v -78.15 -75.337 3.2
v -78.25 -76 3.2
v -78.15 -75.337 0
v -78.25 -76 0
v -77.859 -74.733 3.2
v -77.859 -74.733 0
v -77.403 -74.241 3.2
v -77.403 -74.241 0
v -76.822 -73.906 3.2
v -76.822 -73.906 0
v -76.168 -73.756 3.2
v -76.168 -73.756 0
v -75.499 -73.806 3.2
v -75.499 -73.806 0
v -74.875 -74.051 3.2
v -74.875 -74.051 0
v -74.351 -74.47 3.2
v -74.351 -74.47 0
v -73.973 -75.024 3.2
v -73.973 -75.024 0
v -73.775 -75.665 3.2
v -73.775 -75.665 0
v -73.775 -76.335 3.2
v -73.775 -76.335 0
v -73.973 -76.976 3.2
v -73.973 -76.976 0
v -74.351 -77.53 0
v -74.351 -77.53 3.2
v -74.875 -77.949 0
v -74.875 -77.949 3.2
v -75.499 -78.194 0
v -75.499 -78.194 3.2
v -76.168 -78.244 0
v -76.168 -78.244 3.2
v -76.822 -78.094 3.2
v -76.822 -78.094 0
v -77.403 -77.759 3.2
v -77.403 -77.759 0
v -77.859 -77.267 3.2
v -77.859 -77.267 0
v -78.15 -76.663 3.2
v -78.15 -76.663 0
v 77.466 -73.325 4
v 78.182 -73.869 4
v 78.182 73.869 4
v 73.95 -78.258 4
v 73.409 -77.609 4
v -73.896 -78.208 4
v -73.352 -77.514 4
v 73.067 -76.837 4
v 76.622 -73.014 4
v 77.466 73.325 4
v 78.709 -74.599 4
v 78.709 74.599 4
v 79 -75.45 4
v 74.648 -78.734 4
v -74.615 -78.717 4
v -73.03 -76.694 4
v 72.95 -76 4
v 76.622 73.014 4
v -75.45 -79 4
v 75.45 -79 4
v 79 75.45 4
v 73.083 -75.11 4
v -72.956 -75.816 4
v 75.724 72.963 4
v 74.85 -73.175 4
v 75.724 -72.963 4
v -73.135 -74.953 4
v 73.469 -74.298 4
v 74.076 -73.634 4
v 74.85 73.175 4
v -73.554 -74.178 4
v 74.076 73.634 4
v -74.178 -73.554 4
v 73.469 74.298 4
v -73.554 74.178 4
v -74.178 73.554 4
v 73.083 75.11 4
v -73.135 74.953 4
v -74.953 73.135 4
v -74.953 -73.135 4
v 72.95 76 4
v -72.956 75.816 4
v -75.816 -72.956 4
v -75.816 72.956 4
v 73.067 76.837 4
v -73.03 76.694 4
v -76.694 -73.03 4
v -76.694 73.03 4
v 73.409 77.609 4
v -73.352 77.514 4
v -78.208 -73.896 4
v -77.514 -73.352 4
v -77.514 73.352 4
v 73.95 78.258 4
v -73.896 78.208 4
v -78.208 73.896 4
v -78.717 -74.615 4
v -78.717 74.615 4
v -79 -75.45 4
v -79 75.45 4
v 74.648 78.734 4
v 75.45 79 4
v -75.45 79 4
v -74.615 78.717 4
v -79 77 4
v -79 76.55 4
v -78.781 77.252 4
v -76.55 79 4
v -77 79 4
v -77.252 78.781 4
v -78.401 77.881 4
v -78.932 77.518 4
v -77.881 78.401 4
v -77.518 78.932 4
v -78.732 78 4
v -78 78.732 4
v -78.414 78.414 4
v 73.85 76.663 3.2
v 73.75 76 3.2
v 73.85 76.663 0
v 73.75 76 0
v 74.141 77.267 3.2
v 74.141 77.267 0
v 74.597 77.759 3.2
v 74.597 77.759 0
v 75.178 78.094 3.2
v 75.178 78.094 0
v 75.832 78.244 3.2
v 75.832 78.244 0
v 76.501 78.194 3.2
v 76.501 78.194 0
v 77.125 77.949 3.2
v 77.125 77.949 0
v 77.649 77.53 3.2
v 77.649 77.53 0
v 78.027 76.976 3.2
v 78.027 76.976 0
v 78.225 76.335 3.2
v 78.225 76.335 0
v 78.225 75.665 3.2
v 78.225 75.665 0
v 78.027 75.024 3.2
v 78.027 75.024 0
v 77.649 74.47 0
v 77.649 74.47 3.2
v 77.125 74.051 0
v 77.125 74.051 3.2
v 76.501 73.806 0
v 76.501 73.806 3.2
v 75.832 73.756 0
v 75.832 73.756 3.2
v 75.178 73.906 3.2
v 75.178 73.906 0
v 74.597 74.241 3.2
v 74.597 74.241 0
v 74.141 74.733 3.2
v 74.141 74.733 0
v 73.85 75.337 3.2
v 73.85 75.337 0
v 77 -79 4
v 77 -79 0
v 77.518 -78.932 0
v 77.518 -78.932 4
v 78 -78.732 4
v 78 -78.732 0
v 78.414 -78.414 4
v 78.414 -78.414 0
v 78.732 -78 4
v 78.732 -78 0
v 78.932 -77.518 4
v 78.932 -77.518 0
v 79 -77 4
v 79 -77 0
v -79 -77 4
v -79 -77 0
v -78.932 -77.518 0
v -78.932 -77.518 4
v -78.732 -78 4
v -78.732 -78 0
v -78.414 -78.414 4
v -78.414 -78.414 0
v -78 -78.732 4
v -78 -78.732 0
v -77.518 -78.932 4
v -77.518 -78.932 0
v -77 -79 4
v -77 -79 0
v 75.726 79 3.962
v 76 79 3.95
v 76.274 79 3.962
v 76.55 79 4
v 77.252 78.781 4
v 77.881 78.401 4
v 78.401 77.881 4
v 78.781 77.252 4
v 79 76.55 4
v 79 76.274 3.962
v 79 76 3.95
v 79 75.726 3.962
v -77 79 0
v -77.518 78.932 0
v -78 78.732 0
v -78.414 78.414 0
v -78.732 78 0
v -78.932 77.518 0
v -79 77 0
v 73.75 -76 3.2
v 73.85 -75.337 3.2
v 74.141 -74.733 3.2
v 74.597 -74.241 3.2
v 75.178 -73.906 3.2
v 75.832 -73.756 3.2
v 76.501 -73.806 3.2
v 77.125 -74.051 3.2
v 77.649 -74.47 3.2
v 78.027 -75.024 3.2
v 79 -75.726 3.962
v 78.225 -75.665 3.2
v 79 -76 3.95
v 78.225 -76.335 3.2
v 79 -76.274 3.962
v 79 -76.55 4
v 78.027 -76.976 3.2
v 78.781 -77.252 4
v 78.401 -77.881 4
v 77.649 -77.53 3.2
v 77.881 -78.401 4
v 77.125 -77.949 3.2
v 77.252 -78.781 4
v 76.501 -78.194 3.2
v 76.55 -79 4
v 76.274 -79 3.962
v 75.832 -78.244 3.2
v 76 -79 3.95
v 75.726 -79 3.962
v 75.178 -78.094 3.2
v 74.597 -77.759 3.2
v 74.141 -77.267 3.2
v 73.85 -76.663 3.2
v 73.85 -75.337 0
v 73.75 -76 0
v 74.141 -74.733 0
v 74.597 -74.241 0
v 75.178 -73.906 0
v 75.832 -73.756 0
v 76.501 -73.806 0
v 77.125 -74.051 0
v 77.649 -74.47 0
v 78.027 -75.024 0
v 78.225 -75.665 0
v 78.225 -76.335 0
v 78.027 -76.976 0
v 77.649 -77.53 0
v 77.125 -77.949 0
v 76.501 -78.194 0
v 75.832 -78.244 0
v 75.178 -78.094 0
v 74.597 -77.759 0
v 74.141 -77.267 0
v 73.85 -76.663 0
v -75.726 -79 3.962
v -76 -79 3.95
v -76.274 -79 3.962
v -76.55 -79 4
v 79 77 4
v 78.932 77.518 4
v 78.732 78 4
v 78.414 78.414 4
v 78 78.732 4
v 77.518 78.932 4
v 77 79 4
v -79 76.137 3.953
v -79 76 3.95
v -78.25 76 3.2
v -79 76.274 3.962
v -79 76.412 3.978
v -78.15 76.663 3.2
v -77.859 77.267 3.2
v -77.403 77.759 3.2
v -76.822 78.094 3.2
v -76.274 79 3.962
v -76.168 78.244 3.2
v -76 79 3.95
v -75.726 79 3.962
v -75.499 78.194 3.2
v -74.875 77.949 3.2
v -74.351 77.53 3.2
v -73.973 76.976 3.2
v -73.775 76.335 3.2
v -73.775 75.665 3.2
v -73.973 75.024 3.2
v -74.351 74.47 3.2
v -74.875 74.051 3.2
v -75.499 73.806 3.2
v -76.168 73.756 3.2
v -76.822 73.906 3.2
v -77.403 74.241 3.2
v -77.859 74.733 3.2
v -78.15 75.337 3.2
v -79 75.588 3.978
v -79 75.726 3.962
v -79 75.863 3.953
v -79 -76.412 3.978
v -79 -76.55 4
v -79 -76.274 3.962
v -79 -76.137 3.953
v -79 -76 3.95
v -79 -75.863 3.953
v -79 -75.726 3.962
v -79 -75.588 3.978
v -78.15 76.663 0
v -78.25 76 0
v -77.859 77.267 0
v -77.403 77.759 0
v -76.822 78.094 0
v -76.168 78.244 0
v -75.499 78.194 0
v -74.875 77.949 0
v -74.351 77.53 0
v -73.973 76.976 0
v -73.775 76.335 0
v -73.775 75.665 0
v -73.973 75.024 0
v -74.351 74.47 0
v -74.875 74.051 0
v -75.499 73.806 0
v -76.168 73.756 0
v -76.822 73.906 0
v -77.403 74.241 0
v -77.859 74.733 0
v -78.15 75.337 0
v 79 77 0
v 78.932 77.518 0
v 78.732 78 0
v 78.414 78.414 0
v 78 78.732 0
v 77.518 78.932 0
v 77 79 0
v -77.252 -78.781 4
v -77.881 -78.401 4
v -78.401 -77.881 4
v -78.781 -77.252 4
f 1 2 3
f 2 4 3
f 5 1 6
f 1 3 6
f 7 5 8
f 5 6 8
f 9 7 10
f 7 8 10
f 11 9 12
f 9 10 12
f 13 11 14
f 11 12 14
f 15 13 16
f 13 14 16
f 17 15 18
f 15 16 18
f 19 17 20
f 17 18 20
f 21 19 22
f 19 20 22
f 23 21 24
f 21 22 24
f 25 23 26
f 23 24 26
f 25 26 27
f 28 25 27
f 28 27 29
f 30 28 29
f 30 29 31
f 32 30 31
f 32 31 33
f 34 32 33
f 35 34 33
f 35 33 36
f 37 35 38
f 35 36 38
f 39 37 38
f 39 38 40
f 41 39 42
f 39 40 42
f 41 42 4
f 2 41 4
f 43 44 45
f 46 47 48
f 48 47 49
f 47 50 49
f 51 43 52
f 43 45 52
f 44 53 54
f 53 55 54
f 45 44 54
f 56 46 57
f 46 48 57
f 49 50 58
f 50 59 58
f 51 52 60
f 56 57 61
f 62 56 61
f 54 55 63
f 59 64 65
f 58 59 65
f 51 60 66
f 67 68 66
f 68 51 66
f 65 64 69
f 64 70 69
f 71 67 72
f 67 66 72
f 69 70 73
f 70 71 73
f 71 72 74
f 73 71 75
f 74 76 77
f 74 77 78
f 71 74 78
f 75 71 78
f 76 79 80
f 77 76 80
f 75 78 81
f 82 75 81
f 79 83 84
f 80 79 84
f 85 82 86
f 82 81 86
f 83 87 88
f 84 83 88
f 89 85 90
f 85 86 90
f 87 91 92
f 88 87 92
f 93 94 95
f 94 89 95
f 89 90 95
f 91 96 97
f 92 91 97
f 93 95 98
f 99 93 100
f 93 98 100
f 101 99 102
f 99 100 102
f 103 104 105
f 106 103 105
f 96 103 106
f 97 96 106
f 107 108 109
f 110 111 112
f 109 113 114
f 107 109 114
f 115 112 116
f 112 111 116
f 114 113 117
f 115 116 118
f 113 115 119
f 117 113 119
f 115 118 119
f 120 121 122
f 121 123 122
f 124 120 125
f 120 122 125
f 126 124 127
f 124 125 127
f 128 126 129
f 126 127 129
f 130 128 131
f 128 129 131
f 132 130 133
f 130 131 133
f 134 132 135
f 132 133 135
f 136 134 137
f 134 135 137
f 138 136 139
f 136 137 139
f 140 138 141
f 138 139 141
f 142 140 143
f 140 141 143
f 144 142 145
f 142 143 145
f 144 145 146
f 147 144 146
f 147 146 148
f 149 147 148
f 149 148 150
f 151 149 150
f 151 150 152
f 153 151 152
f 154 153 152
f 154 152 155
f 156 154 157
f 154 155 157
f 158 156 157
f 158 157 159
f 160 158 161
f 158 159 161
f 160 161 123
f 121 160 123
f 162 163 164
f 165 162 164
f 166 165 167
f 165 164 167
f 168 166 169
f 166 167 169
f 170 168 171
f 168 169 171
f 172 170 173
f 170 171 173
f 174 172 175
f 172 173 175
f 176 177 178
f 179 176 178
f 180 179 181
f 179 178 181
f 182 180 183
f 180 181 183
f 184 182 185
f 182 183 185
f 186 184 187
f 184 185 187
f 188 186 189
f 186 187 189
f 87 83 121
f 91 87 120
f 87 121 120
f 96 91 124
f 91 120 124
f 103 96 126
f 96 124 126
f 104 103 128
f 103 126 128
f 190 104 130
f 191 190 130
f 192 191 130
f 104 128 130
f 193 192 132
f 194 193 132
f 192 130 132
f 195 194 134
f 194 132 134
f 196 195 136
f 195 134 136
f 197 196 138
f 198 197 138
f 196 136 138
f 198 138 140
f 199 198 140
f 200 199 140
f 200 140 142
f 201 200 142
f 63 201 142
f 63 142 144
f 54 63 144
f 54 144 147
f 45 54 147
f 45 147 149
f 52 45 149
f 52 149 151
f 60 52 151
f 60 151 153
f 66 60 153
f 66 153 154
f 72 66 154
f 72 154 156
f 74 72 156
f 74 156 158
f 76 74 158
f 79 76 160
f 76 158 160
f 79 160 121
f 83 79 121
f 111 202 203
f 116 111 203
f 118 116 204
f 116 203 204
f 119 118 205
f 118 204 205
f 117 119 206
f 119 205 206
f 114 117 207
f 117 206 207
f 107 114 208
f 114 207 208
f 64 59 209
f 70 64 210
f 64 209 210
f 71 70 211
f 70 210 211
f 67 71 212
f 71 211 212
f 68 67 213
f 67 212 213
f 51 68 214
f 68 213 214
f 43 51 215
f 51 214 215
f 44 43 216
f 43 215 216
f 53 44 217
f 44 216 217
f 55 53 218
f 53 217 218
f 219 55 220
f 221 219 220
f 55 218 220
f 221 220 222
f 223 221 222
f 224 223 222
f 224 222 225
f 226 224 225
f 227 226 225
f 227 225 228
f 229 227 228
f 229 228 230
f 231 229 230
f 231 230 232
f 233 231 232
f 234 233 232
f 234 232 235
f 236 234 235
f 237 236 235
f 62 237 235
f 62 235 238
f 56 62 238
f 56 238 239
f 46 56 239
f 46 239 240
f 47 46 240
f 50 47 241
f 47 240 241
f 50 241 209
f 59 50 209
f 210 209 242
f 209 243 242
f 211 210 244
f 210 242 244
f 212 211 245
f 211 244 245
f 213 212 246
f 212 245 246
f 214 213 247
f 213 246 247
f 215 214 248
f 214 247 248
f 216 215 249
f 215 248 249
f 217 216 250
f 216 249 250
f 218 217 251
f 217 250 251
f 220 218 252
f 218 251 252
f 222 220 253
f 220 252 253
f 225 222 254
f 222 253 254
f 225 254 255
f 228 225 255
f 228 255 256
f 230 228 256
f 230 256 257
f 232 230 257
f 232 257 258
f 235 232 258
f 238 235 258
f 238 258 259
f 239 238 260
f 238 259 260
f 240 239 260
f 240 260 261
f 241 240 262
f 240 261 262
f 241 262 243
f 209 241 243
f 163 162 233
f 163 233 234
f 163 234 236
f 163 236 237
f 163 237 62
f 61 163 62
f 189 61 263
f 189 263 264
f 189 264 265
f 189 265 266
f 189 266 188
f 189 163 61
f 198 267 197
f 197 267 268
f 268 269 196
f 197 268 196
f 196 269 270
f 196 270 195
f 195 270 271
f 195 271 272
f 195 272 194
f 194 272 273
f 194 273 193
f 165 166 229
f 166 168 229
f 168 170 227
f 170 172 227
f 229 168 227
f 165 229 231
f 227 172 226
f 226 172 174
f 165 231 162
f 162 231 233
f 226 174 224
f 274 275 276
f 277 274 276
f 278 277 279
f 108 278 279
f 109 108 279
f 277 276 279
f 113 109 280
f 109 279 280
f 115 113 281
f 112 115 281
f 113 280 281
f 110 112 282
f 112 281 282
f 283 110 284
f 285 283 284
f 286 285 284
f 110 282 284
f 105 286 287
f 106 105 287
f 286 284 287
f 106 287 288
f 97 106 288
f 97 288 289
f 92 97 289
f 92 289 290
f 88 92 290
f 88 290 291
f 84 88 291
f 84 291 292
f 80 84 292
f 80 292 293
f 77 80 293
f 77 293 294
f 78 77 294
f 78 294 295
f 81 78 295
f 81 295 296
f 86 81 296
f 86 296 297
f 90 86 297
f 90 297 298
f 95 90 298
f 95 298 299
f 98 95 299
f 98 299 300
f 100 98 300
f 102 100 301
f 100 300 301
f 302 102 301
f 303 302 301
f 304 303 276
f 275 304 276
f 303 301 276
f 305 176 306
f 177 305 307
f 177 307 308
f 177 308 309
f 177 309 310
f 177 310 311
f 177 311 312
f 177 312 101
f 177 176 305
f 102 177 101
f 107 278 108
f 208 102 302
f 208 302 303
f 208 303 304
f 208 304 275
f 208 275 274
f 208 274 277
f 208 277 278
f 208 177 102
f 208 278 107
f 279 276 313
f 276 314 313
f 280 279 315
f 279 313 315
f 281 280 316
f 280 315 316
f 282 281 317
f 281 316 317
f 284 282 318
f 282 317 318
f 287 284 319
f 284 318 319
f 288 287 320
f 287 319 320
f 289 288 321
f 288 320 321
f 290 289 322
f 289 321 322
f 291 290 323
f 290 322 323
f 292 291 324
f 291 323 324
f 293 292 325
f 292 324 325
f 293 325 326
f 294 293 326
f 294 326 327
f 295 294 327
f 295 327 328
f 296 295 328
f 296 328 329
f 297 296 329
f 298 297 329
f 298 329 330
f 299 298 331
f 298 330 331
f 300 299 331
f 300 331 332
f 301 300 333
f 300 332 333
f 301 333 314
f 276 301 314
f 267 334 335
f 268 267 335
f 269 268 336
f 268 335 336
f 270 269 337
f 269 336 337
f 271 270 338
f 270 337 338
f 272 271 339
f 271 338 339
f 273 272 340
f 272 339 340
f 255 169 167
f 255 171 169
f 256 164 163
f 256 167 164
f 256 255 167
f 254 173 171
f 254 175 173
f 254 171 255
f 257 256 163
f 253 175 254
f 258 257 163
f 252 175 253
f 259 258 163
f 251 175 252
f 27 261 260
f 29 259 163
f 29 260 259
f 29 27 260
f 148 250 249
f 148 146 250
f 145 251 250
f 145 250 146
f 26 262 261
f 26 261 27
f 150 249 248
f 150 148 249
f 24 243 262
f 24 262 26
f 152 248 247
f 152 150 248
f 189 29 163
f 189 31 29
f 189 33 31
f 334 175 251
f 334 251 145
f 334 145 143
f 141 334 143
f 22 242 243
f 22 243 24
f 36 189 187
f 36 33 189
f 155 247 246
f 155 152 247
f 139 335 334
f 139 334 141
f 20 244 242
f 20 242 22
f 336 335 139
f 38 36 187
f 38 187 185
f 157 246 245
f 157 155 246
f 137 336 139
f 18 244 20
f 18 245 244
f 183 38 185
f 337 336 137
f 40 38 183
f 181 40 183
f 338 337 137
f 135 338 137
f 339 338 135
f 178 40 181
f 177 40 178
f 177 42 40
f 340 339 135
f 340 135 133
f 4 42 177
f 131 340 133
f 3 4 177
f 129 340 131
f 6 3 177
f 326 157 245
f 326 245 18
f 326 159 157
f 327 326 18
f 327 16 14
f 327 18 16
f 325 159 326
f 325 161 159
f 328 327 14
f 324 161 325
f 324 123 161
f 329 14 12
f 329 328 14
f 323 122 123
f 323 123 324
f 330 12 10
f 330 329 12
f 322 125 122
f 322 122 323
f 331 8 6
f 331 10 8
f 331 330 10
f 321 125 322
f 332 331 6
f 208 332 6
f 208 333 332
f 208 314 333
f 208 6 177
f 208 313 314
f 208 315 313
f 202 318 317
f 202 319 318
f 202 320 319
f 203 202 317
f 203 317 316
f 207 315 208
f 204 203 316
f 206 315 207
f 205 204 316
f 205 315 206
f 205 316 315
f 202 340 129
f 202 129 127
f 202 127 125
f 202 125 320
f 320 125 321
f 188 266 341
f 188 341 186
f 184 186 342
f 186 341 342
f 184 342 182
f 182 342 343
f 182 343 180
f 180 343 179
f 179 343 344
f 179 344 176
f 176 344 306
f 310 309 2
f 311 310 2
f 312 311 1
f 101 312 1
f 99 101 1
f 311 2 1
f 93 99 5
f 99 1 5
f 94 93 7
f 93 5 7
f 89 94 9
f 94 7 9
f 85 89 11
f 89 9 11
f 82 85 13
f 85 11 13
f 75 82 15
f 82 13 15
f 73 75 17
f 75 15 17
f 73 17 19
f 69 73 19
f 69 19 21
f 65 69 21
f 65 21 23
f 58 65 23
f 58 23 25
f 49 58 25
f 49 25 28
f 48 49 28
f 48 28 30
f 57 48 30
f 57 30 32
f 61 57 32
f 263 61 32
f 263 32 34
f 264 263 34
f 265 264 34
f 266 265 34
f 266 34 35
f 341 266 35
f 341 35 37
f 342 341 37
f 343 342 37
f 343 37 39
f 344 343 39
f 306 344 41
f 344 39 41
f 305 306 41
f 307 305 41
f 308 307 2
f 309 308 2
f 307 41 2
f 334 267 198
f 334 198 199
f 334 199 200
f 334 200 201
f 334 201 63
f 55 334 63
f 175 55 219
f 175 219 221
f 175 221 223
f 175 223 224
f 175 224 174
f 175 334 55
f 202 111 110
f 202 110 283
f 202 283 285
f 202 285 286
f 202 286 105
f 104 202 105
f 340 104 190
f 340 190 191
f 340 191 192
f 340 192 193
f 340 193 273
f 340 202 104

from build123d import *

# Parameters (mm, degrees)
PAD_DEPTH        = 4
HOLE_D           = 4.5
HOLE_DEPTH       = 4
HOLE_CSINK_D     = 6.1
HOLE_CSINK_ANGLE = 90
HOLE_TIPS_R      = 2.25


with BuildPart() as part:
    # Sketch → Pad (new body)
    with BuildSketch(Plane.XY):
        with BuildLine():
            Line((-77, 79), (77, 79))
            ThreePointArc((79, 77), (78.414214, 78.414214), (77, 79))
            Line((79, 77), (79, -77))
            ThreePointArc((77, -79), (78.414214, -78.414214), (79, -77))
            Line((77, -79), (-77, -79))
            ThreePointArc((-79, -77), (-78.414214, -78.414214), (-77, -79))
            Line((-79, -77), (-79, 77))
            ThreePointArc((-77, 79), (-78.414214, 78.414214), (-79, 77))
        make_face()
    extrude(amount=PAD_DEPTH)

    # Hole
    with Locations(Plane.XY.offset(4)):
        with Locations((-76, 76), (76, 76), (76, -76), (-76, -76)):
            CounterSinkHole(HOLE_D / 2, HOLE_CSINK_D / 2, depth=HOLE_DEPTH, counter_sink_angle=HOLE_CSINK_ANGLE)

    # Hole tips → Hole tip 1 section 0
    with BuildSketch(Plane.XY, mode=Mode.PRIVATE) as hole_tip_1_s0:
        with Locations((-76, 76)):
            Circle(HOLE_TIPS_R)
    loft([hole_tip_1_s0.sketch, Vertex(-76, 76, -1.351936)], mode=Mode.SUBTRACT)

    # Hole tips → Hole tip 2 section 0
    with BuildSketch(Plane.XY, mode=Mode.PRIVATE) as hole_tip_2_s0:
        with Locations((76, 76)):
            Circle(HOLE_TIPS_R)
    loft([hole_tip_2_s0.sketch, Vertex(76, 76, -1.351936)], mode=Mode.SUBTRACT)

    # Hole tips → Hole tip 3 section 0
    with BuildSketch(Plane.XY, mode=Mode.PRIVATE) as hole_tip_3_s0:
        with Locations((76, -76)):
            Circle(HOLE_TIPS_R)
    loft([hole_tip_3_s0.sketch, Vertex(76, -76, -1.351936)], mode=Mode.SUBTRACT)

    # Hole tips → Hole tip 4 section 0
    with BuildSketch(Plane.XY, mode=Mode.PRIVATE) as hole_tip_4_s0:
        with Locations((-76, -76)):
            Circle(HOLE_TIPS_R)
    loft([hole_tip_4_s0.sketch, Vertex(-76, -76, -1.351936)], mode=Mode.SUBTRACT)


solid = part.part
